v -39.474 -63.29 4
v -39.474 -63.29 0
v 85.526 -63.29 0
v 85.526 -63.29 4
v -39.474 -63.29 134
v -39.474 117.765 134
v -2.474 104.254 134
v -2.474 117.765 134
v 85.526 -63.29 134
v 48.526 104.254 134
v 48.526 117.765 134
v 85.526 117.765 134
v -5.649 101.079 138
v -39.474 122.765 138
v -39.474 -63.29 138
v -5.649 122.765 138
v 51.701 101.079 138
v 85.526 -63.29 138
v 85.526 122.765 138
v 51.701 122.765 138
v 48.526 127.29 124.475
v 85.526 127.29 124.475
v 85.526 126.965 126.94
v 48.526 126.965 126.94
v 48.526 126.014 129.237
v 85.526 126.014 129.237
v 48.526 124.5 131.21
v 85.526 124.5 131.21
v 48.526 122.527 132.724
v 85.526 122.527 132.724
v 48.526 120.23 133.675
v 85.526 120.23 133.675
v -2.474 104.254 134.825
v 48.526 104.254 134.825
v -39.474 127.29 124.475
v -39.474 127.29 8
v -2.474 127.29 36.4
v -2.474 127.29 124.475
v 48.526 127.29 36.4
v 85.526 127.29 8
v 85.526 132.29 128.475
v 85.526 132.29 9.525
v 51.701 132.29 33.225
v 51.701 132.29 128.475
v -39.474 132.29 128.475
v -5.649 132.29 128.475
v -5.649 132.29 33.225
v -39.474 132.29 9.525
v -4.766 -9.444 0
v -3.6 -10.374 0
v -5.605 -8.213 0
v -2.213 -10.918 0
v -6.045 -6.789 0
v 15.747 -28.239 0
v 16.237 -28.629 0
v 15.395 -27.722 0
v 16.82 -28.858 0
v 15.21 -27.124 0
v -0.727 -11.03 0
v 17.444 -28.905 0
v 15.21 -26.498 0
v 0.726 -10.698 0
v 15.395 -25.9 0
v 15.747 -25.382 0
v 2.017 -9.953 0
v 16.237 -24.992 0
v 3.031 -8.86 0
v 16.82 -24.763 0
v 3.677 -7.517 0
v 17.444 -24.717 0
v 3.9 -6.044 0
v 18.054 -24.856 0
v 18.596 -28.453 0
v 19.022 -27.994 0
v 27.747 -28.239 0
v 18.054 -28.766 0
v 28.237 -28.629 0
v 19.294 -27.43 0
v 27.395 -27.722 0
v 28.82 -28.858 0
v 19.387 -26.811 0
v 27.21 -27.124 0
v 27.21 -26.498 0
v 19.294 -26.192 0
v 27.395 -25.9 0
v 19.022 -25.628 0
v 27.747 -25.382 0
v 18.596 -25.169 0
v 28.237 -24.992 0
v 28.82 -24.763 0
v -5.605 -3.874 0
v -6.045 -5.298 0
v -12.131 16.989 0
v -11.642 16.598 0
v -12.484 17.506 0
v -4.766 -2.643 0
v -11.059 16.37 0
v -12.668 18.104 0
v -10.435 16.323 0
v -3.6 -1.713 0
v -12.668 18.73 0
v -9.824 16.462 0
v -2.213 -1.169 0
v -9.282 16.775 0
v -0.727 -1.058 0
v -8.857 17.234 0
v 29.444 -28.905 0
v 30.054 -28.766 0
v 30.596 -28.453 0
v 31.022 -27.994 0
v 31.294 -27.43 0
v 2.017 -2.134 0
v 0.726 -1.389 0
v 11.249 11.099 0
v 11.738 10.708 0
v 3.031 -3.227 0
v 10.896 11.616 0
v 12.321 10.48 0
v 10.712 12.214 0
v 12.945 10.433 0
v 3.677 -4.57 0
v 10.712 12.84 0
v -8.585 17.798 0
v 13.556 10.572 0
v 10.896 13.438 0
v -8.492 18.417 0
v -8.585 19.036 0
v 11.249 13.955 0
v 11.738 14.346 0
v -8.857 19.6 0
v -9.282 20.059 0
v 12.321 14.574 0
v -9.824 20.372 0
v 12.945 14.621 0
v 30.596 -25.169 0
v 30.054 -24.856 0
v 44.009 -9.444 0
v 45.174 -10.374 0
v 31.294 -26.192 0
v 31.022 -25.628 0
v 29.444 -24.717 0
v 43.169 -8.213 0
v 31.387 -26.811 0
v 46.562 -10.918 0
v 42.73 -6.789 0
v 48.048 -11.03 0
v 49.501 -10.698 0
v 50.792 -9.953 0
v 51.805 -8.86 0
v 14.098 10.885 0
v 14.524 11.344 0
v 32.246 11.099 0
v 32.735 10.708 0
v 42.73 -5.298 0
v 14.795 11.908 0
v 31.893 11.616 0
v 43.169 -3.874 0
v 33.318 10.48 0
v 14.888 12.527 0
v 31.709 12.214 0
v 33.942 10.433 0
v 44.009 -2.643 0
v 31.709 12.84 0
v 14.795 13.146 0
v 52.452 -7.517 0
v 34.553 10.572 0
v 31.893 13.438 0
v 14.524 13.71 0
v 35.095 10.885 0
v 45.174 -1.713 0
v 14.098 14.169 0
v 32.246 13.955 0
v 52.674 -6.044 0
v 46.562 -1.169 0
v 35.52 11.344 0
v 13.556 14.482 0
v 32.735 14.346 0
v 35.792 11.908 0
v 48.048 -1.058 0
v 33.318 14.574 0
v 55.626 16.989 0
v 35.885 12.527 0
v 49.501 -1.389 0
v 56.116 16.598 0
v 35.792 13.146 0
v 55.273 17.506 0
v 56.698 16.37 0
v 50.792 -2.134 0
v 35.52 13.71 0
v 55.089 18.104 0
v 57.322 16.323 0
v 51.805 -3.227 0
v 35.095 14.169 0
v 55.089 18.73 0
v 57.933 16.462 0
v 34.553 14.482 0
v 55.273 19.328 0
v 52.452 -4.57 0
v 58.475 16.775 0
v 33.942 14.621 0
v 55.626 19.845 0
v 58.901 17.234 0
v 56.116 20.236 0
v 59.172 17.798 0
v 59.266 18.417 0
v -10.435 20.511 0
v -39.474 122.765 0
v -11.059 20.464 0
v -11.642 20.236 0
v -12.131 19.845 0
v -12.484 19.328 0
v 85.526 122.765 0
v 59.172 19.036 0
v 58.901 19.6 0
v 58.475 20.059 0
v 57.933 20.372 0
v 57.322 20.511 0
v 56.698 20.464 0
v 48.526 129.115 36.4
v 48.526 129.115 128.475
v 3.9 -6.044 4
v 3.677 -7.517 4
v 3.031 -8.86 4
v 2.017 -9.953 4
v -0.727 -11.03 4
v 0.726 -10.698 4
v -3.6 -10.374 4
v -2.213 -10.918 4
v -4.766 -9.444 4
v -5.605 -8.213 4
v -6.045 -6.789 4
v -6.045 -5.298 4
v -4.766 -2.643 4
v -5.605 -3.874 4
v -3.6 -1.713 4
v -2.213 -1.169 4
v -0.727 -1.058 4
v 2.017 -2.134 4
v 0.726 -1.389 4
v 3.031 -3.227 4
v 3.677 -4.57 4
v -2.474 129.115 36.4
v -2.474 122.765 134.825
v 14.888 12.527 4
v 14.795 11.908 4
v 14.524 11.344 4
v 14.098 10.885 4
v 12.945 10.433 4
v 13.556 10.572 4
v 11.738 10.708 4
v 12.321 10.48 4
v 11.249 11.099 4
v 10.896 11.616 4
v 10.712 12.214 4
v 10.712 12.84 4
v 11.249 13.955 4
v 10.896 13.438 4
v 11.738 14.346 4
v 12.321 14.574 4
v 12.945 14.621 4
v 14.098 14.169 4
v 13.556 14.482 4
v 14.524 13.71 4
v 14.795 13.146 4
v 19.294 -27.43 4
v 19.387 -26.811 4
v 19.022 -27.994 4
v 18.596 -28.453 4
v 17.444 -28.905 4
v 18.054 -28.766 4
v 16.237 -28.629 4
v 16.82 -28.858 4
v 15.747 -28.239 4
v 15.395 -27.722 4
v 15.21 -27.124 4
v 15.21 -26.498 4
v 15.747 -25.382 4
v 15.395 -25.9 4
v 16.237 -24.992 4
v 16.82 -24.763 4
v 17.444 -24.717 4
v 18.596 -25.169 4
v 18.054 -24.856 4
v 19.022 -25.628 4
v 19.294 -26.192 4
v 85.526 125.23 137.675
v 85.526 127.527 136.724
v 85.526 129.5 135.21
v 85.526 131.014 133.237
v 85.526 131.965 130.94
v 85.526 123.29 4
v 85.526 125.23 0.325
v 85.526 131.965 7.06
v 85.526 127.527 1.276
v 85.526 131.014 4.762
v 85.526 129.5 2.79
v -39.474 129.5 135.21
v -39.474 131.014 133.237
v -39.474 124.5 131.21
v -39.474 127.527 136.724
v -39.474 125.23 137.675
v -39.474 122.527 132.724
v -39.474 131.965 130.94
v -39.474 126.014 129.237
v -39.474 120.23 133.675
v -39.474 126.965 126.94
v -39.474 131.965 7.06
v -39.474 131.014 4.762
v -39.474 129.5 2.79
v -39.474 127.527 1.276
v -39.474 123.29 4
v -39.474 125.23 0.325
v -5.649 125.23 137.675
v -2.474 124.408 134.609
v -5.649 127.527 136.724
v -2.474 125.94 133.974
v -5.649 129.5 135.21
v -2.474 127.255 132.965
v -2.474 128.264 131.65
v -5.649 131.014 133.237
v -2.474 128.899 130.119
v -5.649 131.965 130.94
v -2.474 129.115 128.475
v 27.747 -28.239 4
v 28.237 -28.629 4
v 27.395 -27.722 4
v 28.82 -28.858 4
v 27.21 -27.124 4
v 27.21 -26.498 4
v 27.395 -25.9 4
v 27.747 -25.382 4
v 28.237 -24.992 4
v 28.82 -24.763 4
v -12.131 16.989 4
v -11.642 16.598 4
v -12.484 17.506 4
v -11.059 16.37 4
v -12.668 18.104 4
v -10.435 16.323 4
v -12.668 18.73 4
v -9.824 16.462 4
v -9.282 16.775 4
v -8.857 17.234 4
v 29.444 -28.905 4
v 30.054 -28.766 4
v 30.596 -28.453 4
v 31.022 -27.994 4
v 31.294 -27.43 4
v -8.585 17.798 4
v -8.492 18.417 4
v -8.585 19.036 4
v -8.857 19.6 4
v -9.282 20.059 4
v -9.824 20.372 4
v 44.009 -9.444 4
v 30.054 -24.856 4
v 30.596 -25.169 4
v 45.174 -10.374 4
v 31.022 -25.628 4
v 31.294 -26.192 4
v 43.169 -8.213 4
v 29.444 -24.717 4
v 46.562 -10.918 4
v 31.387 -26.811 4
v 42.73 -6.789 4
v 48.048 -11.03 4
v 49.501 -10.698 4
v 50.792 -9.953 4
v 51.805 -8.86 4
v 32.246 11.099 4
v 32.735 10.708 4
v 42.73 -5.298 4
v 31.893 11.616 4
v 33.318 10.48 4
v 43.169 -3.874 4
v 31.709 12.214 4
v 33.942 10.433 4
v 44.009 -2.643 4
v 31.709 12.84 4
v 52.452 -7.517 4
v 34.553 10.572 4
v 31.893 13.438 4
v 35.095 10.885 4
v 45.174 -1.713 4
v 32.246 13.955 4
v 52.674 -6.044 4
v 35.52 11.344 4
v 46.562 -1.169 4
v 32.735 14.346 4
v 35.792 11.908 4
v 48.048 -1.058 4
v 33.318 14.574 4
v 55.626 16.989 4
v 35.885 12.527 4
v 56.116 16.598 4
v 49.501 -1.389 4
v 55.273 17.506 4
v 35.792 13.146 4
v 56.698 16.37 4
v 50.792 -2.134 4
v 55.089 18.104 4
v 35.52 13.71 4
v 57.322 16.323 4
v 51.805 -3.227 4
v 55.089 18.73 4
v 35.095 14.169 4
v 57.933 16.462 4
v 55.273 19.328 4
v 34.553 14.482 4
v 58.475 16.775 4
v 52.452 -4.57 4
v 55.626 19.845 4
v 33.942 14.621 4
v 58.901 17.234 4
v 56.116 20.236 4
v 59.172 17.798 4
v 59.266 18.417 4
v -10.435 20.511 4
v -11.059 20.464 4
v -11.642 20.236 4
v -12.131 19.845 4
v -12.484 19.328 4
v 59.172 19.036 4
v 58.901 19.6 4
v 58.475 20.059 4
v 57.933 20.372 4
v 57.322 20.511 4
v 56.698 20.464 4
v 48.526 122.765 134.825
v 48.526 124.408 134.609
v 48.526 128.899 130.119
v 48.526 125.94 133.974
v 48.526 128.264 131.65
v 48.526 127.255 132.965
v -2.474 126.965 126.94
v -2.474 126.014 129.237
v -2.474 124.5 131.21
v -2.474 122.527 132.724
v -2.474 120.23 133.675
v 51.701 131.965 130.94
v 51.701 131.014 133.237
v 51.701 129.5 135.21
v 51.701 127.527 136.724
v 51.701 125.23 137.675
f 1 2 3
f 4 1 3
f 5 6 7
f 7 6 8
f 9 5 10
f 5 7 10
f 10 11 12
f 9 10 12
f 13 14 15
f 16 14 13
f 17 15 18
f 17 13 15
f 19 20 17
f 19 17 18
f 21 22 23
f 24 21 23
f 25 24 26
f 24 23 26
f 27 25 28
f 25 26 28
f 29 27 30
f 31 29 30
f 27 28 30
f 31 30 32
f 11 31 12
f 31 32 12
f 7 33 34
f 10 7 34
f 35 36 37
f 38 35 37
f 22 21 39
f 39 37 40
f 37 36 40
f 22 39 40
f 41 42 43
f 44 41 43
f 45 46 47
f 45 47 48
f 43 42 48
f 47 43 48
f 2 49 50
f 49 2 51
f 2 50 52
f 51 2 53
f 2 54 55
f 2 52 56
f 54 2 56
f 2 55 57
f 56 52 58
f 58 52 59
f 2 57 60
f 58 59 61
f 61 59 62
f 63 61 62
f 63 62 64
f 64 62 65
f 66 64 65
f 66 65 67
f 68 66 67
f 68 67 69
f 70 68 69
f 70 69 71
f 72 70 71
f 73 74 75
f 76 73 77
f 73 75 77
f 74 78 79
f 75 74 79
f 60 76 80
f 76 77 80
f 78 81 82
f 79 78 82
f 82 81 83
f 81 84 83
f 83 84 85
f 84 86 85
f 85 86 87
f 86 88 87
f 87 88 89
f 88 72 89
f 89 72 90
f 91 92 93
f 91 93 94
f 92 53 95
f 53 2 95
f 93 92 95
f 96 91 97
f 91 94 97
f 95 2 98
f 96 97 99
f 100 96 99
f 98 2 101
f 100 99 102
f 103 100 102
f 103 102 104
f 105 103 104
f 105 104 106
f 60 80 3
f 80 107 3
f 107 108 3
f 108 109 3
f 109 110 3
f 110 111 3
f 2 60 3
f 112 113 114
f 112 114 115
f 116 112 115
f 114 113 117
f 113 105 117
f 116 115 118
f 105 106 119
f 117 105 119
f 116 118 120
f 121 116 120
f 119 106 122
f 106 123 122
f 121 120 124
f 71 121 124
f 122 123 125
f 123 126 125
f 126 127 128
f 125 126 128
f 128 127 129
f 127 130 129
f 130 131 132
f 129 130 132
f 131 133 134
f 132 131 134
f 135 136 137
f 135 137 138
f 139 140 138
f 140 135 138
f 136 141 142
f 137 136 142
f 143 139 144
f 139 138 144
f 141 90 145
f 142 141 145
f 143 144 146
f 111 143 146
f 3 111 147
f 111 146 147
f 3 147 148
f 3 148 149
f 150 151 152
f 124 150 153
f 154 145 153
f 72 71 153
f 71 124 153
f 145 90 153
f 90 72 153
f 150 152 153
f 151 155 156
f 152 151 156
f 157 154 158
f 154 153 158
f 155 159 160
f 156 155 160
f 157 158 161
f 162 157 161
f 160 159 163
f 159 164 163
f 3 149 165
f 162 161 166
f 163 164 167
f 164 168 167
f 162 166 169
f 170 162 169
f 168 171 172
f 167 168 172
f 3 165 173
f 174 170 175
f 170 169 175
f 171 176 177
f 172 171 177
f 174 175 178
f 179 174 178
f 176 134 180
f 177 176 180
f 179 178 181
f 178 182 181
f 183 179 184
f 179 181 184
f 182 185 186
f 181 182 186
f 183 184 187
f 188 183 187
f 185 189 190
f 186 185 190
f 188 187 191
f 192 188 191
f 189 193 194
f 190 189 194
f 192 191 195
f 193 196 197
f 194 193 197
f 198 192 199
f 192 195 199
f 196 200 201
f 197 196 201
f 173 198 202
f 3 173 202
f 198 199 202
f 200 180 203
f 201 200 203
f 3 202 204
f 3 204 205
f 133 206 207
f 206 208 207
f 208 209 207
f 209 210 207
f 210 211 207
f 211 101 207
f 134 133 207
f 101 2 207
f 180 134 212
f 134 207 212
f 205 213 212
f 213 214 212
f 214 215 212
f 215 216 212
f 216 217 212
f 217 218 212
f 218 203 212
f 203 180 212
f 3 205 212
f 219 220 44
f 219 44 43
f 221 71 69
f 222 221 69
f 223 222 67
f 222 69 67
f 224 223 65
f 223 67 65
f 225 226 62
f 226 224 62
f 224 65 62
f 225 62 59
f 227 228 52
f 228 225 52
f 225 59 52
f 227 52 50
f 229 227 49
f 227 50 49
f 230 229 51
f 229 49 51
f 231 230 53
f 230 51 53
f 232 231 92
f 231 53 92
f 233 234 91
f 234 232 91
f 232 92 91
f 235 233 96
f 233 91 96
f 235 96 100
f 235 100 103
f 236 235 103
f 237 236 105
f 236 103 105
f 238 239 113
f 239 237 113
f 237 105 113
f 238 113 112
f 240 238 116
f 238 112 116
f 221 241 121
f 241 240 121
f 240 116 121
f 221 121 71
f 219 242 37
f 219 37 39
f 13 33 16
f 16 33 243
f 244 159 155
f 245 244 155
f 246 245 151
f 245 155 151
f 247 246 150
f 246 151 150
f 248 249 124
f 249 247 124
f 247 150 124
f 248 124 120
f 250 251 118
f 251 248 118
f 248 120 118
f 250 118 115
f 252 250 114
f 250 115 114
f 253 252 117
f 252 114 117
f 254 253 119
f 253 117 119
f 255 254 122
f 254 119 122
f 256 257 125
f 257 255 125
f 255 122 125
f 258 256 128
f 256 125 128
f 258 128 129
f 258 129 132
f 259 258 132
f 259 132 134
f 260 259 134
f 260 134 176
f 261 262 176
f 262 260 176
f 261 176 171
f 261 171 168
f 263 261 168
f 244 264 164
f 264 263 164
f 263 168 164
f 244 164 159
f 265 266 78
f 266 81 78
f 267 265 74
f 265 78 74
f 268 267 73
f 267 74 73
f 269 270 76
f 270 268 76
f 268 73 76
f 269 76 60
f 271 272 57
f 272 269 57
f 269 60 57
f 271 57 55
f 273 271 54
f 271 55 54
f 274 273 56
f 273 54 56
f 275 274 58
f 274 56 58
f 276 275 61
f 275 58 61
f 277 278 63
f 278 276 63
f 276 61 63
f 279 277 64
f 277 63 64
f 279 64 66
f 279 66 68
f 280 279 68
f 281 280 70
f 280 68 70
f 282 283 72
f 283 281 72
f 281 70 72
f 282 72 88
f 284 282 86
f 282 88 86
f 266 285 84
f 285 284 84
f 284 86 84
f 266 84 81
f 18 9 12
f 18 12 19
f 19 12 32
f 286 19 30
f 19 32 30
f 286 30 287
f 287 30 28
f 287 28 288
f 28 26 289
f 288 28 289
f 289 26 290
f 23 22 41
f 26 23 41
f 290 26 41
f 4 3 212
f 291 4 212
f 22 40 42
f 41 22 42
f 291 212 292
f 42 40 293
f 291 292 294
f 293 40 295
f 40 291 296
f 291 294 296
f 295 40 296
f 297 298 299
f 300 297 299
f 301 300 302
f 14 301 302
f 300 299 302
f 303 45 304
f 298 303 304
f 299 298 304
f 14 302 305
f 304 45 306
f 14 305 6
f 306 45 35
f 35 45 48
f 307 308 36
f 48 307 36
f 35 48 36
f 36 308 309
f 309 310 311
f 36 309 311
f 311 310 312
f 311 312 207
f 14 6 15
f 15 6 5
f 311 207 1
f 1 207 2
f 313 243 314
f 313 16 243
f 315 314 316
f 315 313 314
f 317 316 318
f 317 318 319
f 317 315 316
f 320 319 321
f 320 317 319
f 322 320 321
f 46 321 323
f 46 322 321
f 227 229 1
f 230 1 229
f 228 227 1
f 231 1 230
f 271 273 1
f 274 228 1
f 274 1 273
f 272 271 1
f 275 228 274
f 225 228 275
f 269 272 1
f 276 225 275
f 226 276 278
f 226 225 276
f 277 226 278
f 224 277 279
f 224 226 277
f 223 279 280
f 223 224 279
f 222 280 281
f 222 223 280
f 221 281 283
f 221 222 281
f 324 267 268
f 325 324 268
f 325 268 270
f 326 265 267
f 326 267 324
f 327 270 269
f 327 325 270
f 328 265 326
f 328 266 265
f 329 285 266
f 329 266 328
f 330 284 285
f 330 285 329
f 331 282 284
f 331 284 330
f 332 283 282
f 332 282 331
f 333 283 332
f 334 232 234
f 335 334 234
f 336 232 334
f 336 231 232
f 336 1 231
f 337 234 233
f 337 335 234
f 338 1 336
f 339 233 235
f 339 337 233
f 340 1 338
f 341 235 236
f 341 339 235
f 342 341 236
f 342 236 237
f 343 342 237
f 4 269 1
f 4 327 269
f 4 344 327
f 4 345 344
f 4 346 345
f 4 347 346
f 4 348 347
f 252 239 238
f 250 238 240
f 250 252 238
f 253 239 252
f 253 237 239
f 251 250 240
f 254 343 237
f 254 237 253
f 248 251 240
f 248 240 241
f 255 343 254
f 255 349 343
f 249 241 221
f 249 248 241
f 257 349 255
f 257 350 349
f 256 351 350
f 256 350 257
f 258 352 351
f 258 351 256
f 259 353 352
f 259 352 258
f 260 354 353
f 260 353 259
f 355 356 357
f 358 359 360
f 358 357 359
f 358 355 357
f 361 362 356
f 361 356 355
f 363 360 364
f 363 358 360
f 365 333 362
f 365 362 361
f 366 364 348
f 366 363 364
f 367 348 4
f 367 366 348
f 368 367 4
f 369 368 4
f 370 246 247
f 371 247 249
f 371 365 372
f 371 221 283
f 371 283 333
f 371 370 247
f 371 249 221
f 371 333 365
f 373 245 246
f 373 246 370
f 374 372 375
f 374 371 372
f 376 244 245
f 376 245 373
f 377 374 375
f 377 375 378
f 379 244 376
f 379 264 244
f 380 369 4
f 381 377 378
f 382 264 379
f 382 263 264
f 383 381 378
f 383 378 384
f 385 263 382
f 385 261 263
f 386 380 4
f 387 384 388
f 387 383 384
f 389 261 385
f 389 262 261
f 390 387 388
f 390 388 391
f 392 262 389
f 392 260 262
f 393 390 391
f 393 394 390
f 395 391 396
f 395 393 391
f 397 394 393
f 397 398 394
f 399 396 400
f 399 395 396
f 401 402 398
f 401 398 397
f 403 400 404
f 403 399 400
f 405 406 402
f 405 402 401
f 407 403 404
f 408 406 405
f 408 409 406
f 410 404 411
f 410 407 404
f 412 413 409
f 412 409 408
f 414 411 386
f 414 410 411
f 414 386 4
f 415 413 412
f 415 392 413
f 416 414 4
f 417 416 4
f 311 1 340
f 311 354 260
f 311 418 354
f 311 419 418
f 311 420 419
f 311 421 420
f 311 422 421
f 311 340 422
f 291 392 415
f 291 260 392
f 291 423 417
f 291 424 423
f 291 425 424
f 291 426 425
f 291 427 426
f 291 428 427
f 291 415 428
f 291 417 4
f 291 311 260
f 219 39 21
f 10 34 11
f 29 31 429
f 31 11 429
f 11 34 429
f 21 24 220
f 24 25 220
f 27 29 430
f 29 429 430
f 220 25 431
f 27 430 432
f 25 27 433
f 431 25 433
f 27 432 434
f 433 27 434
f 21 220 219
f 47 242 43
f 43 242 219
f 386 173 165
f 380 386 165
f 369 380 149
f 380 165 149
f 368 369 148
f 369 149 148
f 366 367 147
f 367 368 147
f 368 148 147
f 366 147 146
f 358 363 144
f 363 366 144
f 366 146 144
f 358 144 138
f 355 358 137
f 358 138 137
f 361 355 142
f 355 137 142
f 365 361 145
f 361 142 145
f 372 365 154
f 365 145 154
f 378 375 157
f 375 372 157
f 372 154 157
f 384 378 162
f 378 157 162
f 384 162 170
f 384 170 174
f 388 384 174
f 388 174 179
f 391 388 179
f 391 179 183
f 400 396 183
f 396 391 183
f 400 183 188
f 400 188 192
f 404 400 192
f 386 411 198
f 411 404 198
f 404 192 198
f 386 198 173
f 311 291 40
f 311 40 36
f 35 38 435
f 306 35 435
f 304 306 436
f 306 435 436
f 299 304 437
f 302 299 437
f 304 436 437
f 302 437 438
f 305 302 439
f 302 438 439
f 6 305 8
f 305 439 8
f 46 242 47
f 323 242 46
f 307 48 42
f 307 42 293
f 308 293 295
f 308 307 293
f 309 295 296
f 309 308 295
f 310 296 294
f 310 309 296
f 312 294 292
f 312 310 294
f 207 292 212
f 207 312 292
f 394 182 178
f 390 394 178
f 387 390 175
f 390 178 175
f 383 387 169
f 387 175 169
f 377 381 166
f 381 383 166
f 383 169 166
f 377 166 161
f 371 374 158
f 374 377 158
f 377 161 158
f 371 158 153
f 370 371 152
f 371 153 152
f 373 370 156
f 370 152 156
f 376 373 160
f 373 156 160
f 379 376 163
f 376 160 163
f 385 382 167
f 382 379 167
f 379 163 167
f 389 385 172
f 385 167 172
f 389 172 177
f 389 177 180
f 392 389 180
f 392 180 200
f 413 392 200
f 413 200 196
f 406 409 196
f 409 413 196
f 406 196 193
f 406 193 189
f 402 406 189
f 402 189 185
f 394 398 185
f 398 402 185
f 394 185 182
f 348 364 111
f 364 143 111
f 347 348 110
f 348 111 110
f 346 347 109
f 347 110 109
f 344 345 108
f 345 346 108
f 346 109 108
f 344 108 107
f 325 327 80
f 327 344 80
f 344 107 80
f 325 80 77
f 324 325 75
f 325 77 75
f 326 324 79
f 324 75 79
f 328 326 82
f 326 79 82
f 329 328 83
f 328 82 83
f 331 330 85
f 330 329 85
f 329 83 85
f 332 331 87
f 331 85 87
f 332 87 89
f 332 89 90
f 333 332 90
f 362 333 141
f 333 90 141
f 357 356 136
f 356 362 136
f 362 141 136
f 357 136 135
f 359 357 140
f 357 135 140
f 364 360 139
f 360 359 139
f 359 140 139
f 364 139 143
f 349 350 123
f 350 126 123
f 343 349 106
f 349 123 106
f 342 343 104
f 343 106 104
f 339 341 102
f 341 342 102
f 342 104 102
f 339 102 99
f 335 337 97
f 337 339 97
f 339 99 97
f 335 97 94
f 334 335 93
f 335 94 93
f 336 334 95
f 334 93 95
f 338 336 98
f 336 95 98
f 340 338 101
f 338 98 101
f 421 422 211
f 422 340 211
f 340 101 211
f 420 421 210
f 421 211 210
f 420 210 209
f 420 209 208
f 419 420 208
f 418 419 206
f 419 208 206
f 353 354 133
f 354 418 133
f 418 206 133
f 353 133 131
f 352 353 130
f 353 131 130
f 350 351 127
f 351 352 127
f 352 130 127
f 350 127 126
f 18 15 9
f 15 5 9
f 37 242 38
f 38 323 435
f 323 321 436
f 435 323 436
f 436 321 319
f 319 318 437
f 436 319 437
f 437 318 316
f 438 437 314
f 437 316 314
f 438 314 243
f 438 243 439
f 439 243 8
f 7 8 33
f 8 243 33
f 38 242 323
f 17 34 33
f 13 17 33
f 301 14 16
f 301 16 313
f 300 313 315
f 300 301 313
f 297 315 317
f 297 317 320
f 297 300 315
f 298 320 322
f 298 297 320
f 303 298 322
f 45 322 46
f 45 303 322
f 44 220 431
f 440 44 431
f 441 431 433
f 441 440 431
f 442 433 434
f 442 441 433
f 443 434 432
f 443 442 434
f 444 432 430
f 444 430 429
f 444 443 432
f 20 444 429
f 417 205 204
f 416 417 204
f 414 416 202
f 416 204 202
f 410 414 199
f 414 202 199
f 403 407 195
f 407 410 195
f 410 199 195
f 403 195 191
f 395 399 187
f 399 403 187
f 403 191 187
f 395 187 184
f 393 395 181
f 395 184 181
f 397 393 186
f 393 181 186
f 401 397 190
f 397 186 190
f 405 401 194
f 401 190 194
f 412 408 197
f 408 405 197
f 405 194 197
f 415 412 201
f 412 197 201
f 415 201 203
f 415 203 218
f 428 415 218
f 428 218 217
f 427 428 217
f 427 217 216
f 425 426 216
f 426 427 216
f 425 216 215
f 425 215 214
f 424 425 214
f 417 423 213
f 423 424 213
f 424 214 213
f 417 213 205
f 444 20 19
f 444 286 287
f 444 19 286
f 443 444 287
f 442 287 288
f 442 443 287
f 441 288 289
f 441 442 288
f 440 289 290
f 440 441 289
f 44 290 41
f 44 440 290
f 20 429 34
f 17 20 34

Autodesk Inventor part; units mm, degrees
ref_plane "YZ Plane" through (0, 0, 0) normal (1, 0, 0) x (0, 1, 0)
ref_plane "XZ Plane" through (0, 0, 0) normal (0, 1, 0) x (-1, 0, 0)
ref_plane "XY Plane" through (0, 0, 0) normal (0, 0, 1) x (1, 0, 0)
sketch "Sketch1" plane through (0, 0, 0) normal (0, 0, 1) x (1, 0, 0)
  circle A0 centre (57.1655, 18.417) radius 2.1 projected
  circle A1 centre (12.7885, 12.5269) radius 2.1 projected
  circle A2 centre (17.2869, -26.8107) radius 2.1 projected
  circle A3 centre (-1.1004, -6.0436) radius 5 projected
  line L0 (64.4194, 6.1067) -> (62.3371, -1.6056) projected
  line L1 (67.3095, 9.3686) -> (64.4194, 6.1067) projected
  ellipse E0 centre (57.1655, 18.417) end of major axis (47.0979, 27.5508) minor radius 11.51 (67.3095, 9.3686) -> (68.6853, 21.7358) ccw projected
  ellipse E1 centre (54.4602, 15.4351) end of major axis (43.6731, 3.5452) minor radius 13.5934 (68.6853, 21.7358) -> (59.3507, 30.2045) ccw projected
  ellipse E2 centre (57.1655, 18.417) end of major axis (47.0979, 27.5508) minor radius 11.51 (59.3507, 30.2045) -> (47.0214, 27.4655) ccw projected
  line L2 (36.5043, 15.5956) -> (47.0214, 27.4655) projected
  arc A4 (36.5043, 15.5956) -> (29.6862, 12.4398) centre (33.7853, 12.5269) ccw projected
  line L3 (16.8875, 12.4398) -> (29.6862, 12.4398) projected
  arc A5 (16.8875, 12.4398) -> (10.0695, 15.5956) centre (12.7885, 12.5269) ccw projected
  line L4 (10.0695, 15.5956) -> (-0.4476, 27.4655) projected
  ellipse E3 centre (-10.5917, 18.417) end of major axis (-0.5241, 27.5508) minor radius 11.51 (-0.4476, 27.4655) -> (-12.7769, 30.2045) ccw projected
  ellipse E4 centre (-7.8864, 15.4351) end of major axis (2.9006, 3.5452) minor radius 13.5934 (-12.7769, 30.2045) -> (-22.1115, 21.7358) ccw projected
  ellipse E5 centre (-10.5917, 18.417) end of major axis (-0.5241, 27.5508) minor radius 11.51 (-22.1115, 21.7358) -> (-20.7358, 9.3686) ccw projected
  line L5 (-20.7358, 9.3686) -> (-17.8456, 6.1067) projected
  line L6 (-17.8456, 6.1067) -> (-15.7633, -1.6056) projected
  line L7 (-15.7633, -1.6056) -> (-6.4546, -11.2249) projected
  line L8 (-6.4546, -11.2249) -> (1.9738, -21.6241) projected
  line L9 (1.9738, -21.6241) -> (9.6038, -24.7107) projected
  line L10 (9.6038, -24.7107) -> (14.4693, -29.7892) projected
  arc A6 (14.4693, -29.7892) -> (17.2869, -30.9107) centre (17.2869, -26.8107) ccw projected
  line L11 (17.2869, -30.9107) -> (29.2869, -30.9107) projected
  arc A7 (29.2869, -30.9107) -> (32.1045, -29.7892) centre (29.2869, -26.8107) ccw projected
  line L12 (36.97, -24.7107) -> (32.1045, -29.7892) projected
  line L13 (44.6, -21.6241) -> (36.97, -24.7107) projected
  line L14 (53.0284, -11.2249) -> (44.6, -21.6241) projected
  line L15 (62.3371, -1.6056) -> (53.0284, -11.2249) projected
  circle A8 centre (-10.5917, 18.417) radius 2.1 projected
  circle A9 centre (47.6742, -6.0436) radius 5 projected
  circle A10 centre (29.2869, -26.8107) radius 2.1 projected
  circle A11 centre (33.7853, 12.5269) radius 2.1 projected
  arc A12 (-51.3703, 45.0767) -> (97.4441, 45.0767) centre (23.0369, 31.7099) ccw construction
  arc A13 (51.5869, 99.9923) -> (-5.5131, 99.9923) centre (23.0369, 31.7099) ccw construction
  arc A14 (-50.582, -28.3339) -> (101.2571, -22.203) centre (23.0369, 31.7099) ccw construction
  line L16 (23.0369, 31.7099) -> (23.2869, -30.9107) construction
  line L17 (85.5258, 132.2899) -> (-39.4742, 132.2899)
  line L18 (-39.4742, 132.2899) -> (-39.4742, -63.2901)
  line L19 (-39.4742, -63.2901) -> (85.5258, -63.2901)
  line L20 (85.5258, -63.2901) -> (85.5258, 132.2899)
  line L21 (85.5258, 132.2899) -> (-39.4742, -63.2901) construction
  line L22 (-39.4742, 132.2899) -> (85.5258, -63.2901) construction
  point P0 (0, 0)
  point P1 (23.0258, 34.4999)
  dimension "d0" = 195.58
  dimension "d27" = 125
extrude "Extrusion1" add sketch "Sketch1" along normal blind 4 contours L0 L15 L14 L13 L12 A7 L11 A6 L10 L9 L8 L7 L6 L5 E5 E4 E3 L4 A5 L3 A4 L2 E2 E1 E0 L1 | L20 L19 L18 L17
sketch "Sketch2" plane through (0, 0, 4) normal (0, 0, 1) x (1, 0, 0)
  line L0 (-39.4742, 132.2899) -> (-39.4742, -63.2901) projected
  line L1 (-39.4742, -63.2901) -> (85.5258, -63.2901) projected
  line L2 (85.5258, -63.2901) -> (85.5258, 132.2899) projected
  line L3 (85.5258, 132.2899) -> (-39.4742, 132.2899) projected
  circle A0 centre (12.7885, 12.5269) radius 2.1 projected
  circle A1 centre (33.7853, 12.5269) radius 2.1 projected
  circle A2 centre (29.2869, -26.8107) radius 2.1 projected
  circle A3 centre (47.6742, -6.0436) radius 5 projected
  circle A4 centre (-10.5917, 18.417) radius 2.1 projected
  circle A5 centre (-1.1004, -6.0436) radius 5 projected
  circle A6 centre (17.2869, -26.8107) radius 2.1 projected
  circle A7 centre (57.1655, 18.417) radius 2.1 projected
  line L4 (85.5258, 132.2899) -> (-39.4742, 132.2899)
  line L5 (-39.4742, 132.2899) -> (-39.4742, 127.2899)
  line L6 (-39.4742, 127.2899) -> (85.5258, 127.2899)
  line L7 (85.5258, 127.2899) -> (85.5258, 132.2899)
  line L8 (52.5258, 127.2899) -> (-6.4742, 127.2899)
  line L9 (-6.4742, 127.2899) -> (-6.4742, 133.2899)
  line L10 (-6.4742, 133.2899) -> (52.5258, 133.2899)
  line L11 (52.5258, 133.2899) -> (52.5258, 127.2899)
  point P0 (0, 0)
  point P1 (-39.4742, 127.2899)
  point P2 (85.5258, 127.2899)
  dimension "d3" = 5
  dimension "d7" = 6
  dimension "d8" = 33
  dimension "d9" = 33
extrude "Extrusion2" add sketch "Sketch2" along normal blind 130 contours L3 L9 L6 L0 | L3 L11 L6 L9 | L3 L2 L6 L11
sketch "Sketch4" plane through (0, 0, 134) normal (0, 0, 1) x (1, 0, 0)
  line L0 (85.5258, 127.2899) -> (-39.4742, 127.2899) projected
  line L1 (-39.4742, 127.2899) -> (-39.4742, -63.2901) projected
  line L2 (-39.4742, -63.2901) -> (85.5258, -63.2901) projected
  line L3 (85.5258, -63.2901) -> (85.5258, 127.2899) projected
  circle A0 centre (12.7885, 12.5269) radius 2.1 projected
  circle A1 centre (33.7853, 12.5269) radius 2.1 projected
  circle A2 centre (29.2869, -26.8107) radius 2.1 projected
  circle A3 centre (47.6742, -6.0436) radius 5 projected
  circle A4 centre (-10.5917, 18.417) radius 2.1 projected
  circle A5 centre (-1.1004, -6.0436) radius 5 projected
  circle A6 centre (17.2869, -26.8107) radius 2.1 projected
  circle A7 centre (57.1655, 18.417) radius 2.1 projected
  line L4 (85.5258, 127.2899) -> (85.5258, 132.2899) projected
  line L5 (85.5258, 132.2899) -> (-39.4742, 132.2899) projected
  line L6 (-39.4742, 132.2899) -> (-39.4742, 127.2899) projected
  line L7 (-39.4742, 127.2899) -> (85.5258, 127.2899) projected
  point P0 (0, 0)
extrude "Extrusion3" add sketch "Sketch4" along normal blind 4 contours L3 L2 L1 L0 | L0 L6 L5 L4 | A0 | A1 | A2 | A3 | A4 | A5 | A6 | A7
fillet "Fillet1" [suppressed]
sketch "Sketch6" plane through (0, 0, 138) normal (0, 0, 1) x (1, 0, 0)
  line L0 (85.5258, 132.2899) -> (-39.4742, 132.2899) projected
  line L1 (-39.4742, 132.2899) -> (-39.4742, -63.2901) projected
  line L2 (-39.4742, -63.2901) -> (85.5258, -63.2901) projected
  line L3 (85.5258, -63.2901) -> (85.5258, 132.2899) projected
  line L4 (48.5258, 138.9893) -> (-2.4742, 138.9893)
  line L5 (-2.4742, 138.9893) -> (-2.4742, 104.2541)
  line L6 (-2.4742, 104.2541) -> (48.5258, 104.2541)
  line L7 (48.5258, 104.2541) -> (48.5258, 138.9893)
  point P0 (0, 0)
  dimension "d16" = 37
  dimension "d17" = 37
extrude "Extrusion5" cut sketch "Sketch6" against normal blind 101.6 contours L7 L6 L5 L0 | L0 L5 L4 L7
fillet "Fillet2" radius 9.525 5 edges at (67.0258, 132.2899, 138) (-20.9742, 132.2899, 138) (23.0258, 132.2899, 0) (-20.9742, 127.2899, 134) (67.0258, 127.2899, 134)
chamfer "Chamfer1" distance 3.175 angle 45 8 edges at (23.0258, 132.2899, 36.4) (48.5258, 132.2899, 82.4375) (48.5258, 129.5001, 135.2102) (48.5258, 113.5095, 138) (-2.4742, 132.2899, 82.4375) (-2.4742, 129.5001, 135.2102) (-2.4742, 113.5095, 138) (23.0258, 104.2541, 138)
chamfer "Chamfer2" distance 4 angle 45 1 edges at (23.0258, 127.2899, 4)
equation "\"d9\" = d8"
equation "\"d17\" = d16"
properties part number "Head_Box_Base"
